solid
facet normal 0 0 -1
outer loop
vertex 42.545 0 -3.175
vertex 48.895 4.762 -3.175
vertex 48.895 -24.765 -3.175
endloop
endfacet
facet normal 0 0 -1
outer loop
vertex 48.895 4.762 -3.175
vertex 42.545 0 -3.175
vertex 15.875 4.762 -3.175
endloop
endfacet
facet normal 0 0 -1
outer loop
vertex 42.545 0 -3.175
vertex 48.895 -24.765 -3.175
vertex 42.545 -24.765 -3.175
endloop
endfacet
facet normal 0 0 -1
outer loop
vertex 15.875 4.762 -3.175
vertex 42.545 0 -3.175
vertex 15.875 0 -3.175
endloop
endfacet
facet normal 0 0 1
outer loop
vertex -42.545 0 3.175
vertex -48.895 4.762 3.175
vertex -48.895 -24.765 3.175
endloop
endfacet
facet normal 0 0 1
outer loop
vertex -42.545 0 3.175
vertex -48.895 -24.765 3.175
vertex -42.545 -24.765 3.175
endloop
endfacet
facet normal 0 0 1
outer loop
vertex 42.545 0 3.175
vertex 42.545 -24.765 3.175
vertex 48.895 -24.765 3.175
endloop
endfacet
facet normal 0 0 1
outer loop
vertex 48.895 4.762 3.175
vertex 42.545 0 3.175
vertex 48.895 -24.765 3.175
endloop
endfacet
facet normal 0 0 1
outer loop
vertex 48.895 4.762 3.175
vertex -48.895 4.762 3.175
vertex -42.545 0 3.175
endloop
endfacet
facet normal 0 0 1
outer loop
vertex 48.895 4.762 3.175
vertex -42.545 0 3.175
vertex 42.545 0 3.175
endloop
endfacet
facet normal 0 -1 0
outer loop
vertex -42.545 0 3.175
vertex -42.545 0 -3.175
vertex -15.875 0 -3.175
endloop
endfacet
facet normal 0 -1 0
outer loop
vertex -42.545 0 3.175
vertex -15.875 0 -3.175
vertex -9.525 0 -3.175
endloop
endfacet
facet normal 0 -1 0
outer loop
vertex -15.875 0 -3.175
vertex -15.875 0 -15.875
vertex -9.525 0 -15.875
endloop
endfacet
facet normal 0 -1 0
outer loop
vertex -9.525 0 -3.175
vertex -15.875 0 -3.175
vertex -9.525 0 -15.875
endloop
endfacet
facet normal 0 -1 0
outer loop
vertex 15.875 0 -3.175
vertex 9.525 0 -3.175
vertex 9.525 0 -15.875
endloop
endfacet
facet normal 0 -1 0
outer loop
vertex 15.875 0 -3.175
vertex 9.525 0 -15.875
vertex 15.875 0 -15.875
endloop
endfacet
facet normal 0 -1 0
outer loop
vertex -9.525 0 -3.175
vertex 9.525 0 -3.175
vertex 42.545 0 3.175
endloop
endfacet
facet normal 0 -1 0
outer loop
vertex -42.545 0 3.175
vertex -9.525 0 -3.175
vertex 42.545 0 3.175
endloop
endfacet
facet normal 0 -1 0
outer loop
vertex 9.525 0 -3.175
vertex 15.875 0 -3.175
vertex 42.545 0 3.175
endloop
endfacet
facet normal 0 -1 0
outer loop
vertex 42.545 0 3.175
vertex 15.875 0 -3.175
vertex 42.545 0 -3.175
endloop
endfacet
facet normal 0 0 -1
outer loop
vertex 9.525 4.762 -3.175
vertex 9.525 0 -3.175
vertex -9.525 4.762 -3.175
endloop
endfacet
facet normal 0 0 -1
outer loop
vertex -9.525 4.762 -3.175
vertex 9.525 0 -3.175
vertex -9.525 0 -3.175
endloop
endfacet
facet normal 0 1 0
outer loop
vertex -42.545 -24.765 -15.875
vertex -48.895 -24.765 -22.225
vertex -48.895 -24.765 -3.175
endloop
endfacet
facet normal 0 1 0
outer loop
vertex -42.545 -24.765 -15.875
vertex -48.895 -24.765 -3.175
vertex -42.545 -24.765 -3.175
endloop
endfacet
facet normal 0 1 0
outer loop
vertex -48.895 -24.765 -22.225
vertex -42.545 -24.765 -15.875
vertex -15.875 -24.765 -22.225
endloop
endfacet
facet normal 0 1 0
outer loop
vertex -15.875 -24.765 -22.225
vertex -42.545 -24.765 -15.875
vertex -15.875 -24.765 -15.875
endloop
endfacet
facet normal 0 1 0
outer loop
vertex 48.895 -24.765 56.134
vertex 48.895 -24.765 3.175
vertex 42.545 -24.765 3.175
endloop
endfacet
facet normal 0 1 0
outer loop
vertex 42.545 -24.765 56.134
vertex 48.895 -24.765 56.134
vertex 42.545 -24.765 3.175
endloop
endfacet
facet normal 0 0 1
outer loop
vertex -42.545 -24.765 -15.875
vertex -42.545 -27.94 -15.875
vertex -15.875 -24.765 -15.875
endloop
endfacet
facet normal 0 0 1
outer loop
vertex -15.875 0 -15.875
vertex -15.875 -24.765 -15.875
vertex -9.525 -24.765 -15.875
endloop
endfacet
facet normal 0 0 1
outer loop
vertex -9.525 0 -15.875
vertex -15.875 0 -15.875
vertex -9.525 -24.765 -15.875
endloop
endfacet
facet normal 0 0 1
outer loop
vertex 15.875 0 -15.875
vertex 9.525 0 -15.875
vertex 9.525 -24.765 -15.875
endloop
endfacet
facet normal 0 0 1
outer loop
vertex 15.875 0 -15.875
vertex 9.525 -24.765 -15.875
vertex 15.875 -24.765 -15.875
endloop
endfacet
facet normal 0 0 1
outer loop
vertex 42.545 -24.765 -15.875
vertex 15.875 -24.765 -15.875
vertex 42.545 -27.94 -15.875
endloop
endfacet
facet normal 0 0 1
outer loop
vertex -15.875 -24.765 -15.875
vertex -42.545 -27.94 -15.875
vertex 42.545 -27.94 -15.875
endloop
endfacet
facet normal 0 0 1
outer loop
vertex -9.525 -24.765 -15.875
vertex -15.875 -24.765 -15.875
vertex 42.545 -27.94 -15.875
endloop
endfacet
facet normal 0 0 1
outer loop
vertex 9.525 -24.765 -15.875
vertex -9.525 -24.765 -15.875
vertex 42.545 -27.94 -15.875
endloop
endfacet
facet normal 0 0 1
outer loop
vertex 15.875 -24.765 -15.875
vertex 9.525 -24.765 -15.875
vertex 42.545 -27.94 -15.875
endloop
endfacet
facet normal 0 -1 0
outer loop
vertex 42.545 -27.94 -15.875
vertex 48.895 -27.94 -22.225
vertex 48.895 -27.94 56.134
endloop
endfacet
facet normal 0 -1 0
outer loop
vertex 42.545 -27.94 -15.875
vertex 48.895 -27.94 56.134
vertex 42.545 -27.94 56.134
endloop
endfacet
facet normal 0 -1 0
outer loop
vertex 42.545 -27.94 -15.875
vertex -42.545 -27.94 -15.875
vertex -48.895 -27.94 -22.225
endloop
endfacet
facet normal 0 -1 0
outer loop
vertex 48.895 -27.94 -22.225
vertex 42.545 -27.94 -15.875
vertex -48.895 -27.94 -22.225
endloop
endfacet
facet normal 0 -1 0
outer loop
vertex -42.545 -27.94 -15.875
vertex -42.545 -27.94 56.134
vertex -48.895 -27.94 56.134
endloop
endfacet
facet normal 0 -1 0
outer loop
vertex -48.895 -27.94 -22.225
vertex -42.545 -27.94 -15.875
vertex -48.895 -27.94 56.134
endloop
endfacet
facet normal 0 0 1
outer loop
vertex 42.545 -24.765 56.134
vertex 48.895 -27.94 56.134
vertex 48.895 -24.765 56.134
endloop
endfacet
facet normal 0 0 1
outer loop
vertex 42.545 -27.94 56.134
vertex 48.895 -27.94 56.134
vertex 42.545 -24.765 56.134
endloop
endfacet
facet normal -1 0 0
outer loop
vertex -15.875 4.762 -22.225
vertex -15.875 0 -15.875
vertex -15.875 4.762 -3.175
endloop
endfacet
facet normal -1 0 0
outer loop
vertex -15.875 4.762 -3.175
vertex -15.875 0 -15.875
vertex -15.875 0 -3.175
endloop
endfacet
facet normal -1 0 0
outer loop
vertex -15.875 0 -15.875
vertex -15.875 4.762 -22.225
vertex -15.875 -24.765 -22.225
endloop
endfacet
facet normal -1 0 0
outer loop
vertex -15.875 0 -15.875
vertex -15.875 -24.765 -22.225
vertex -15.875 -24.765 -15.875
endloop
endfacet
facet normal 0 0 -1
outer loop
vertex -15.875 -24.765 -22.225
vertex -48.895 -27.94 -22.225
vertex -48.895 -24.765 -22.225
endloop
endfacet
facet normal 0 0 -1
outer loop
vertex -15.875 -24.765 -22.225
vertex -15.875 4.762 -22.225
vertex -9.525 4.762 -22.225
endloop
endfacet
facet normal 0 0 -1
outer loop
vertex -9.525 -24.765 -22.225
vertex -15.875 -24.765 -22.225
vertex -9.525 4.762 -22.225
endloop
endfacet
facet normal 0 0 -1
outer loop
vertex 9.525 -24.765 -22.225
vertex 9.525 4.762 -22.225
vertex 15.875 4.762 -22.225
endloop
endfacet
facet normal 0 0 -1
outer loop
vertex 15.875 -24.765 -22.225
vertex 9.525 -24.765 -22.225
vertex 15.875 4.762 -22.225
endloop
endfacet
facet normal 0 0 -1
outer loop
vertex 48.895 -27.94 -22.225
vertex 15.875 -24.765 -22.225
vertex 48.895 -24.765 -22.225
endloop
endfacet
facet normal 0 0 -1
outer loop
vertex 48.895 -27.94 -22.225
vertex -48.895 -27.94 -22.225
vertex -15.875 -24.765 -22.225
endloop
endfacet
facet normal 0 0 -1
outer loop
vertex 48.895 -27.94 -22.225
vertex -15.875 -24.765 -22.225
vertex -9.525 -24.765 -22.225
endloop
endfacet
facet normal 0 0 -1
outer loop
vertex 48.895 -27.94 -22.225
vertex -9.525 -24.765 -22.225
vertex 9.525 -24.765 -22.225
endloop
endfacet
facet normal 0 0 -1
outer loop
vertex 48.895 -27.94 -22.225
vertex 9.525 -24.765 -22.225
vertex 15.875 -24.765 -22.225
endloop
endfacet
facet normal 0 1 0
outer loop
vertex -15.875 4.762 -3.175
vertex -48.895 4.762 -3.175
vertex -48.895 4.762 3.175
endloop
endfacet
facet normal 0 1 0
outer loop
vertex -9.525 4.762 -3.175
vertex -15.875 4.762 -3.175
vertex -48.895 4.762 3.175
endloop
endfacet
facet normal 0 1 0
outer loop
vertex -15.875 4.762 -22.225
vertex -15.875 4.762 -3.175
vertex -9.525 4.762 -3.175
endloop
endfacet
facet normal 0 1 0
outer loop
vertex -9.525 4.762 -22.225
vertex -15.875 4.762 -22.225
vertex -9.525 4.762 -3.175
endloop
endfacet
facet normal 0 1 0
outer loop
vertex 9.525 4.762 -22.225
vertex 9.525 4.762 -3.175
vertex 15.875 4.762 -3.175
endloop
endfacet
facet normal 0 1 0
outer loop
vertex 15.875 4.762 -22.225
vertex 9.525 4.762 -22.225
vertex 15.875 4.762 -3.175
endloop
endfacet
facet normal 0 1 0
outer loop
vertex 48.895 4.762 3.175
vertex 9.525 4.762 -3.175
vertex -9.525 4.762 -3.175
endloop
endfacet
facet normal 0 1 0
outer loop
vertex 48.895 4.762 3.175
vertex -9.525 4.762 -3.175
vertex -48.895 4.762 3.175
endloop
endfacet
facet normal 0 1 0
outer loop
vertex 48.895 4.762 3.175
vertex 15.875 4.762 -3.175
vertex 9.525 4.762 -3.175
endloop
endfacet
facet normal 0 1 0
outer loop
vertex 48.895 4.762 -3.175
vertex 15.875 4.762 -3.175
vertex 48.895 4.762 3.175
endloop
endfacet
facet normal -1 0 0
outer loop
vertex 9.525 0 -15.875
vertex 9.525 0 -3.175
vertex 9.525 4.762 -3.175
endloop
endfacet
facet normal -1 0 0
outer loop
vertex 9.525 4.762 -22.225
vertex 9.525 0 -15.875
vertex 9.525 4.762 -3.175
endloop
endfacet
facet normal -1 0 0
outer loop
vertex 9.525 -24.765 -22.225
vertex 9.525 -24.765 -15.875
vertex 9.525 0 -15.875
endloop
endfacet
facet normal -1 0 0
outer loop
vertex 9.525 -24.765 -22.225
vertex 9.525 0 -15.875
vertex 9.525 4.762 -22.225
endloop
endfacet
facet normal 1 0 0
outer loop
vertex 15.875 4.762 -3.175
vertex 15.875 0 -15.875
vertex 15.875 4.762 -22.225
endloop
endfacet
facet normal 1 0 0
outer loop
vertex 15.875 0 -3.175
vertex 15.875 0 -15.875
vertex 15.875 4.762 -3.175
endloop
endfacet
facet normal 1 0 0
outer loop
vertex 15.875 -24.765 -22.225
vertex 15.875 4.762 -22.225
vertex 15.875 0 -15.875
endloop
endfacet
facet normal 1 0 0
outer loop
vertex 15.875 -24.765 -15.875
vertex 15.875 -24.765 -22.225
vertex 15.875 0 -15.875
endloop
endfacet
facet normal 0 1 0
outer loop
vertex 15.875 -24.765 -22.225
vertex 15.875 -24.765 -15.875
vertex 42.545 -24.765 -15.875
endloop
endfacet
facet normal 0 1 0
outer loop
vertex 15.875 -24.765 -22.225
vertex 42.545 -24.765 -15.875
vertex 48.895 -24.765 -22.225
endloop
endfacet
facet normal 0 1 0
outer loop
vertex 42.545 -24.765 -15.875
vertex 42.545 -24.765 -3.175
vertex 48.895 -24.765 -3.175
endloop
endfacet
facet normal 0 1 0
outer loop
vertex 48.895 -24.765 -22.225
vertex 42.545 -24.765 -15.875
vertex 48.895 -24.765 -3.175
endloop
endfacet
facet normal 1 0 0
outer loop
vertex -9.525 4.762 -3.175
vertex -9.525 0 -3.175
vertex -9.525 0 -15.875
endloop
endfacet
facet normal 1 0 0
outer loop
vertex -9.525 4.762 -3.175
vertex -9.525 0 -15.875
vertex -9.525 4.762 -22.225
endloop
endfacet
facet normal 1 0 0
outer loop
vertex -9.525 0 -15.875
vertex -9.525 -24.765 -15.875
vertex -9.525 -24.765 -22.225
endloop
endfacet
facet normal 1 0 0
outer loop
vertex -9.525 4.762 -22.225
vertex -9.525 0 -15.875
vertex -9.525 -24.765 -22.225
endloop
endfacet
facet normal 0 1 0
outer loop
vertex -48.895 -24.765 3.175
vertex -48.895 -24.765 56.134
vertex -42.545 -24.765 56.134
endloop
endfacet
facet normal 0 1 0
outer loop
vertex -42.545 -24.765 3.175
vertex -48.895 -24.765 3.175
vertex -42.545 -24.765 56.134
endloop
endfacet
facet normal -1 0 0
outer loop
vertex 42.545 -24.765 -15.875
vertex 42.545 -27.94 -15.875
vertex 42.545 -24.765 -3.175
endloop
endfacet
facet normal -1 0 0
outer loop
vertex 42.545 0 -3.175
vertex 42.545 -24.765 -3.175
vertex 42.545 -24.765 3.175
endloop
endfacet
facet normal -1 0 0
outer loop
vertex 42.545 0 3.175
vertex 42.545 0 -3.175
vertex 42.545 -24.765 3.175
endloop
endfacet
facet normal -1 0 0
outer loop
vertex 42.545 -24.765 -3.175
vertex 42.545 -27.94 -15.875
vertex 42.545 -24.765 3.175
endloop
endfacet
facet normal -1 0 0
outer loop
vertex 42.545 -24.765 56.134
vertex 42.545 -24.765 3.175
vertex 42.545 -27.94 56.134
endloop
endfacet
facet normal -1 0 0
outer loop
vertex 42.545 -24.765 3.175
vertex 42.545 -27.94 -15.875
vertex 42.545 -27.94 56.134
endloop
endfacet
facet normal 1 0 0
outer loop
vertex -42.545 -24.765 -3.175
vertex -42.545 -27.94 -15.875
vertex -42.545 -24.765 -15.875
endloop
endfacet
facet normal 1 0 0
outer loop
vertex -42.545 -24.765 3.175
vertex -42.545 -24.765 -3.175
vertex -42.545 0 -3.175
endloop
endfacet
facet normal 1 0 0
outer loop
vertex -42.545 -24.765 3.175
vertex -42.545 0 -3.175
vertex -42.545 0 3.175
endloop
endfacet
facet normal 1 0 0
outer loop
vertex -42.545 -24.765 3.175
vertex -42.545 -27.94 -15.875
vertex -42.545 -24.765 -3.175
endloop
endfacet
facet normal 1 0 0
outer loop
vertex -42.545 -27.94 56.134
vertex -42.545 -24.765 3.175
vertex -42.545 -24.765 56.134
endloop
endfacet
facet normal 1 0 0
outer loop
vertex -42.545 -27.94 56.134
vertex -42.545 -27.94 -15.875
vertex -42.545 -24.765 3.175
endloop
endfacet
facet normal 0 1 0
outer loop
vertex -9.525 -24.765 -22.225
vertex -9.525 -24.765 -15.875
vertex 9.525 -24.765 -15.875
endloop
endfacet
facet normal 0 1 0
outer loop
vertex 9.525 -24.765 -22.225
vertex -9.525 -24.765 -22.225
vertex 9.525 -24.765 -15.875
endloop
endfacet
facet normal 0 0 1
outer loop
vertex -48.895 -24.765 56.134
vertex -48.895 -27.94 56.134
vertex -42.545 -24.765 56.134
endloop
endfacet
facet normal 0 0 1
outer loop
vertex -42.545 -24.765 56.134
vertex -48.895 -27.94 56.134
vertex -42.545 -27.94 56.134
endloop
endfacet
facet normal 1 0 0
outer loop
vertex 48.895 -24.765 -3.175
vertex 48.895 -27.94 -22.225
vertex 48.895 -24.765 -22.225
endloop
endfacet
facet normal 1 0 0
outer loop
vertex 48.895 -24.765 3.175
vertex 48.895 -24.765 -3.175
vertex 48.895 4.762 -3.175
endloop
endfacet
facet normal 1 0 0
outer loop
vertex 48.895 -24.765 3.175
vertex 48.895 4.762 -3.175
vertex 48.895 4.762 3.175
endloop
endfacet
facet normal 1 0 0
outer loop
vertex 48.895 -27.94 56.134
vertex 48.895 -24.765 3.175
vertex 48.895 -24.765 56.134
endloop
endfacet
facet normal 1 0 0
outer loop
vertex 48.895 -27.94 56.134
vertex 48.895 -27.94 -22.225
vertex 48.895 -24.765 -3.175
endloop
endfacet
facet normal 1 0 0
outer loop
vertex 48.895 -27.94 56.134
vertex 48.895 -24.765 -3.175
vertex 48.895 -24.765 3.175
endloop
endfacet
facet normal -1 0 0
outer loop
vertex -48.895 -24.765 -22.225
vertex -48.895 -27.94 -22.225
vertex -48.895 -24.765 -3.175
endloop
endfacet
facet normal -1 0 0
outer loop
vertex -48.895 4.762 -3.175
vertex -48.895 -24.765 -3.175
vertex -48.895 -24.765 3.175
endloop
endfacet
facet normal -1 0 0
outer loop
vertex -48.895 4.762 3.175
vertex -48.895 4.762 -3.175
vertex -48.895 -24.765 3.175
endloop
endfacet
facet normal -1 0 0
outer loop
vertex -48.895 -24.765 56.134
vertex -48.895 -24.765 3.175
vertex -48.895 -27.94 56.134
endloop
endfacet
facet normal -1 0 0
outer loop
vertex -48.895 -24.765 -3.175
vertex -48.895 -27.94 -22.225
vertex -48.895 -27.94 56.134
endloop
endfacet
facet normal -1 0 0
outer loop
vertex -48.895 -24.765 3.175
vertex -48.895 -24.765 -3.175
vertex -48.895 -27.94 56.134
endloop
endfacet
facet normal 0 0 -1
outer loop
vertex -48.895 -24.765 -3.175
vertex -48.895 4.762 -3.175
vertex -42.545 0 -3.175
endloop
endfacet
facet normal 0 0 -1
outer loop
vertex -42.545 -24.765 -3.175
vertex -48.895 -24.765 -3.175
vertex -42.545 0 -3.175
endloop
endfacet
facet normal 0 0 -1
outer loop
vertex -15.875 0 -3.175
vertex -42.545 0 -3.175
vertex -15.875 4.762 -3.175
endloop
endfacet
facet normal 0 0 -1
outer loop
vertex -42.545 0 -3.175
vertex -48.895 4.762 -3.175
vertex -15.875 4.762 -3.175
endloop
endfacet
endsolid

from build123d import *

# Parameters (mm, degrees)
BOSS_EXTRUDE1_DEPTH = 4.7625
SKETCH1_3_W         = 6.35
SKETCH1_3_H         = 6.35
BOSS_EXTRUDE2_DEPTH = 27.94
SKETCH2_W           = 19.05
SKETCH2_H           = 6.35
BOSS_EXTRUDE3_DEPTH = 3.175
SKETCH3_W           = 6.35
SKETCH3_H           = 52.959
BOSS_EXTRUDE4_DEPTH = 3.175


with BuildPart() as part:
    # Sketch1 → Boss-Extrude1 (new body)
    with BuildSketch(Plane(origin=(0, 0, 0), x_dir=(1, 0, 0), z_dir=(0, 1, 0))):
        Polygon((-48.895, 3.175), (-48.895, -3.175), (48.895, -3.175), (48.895, 3.175), (-9.525, 3.175), (-9.525, 22.225), (-15.875, 22.225), (-15.875, 3.175), align=None)
    extrude(amount=BOSS_EXTRUDE1_DEPTH)

    # Sketch1<3> → Boss-Extrude2 (add)
    with BuildSketch(Plane(origin=(0, 0, 0), x_dir=(1, 0, 0), z_dir=(0, 1, 0))):
        with Locations((-45.72, 0)):
            Rectangle(SKETCH1_3_W, SKETCH1_3_H)
        with Locations((45.72, 0)):
            Rectangle(SKETCH1_3_W, SKETCH1_3_H)
        with Locations((-12.7, 19.05)):
            Rectangle(SKETCH1_3_W, SKETCH1_3_H)
    extrude(amount=-BOSS_EXTRUDE2_DEPTH)

    # Mirror1: part across plane


with BuildPart() as part_1:
    add(part.part)
    add(part.part.mirror(Plane(origin=(0, 0, 0), x_dir=(0, 0, 1), z_dir=(1, 0, 0))))

    # Sketch2 → Boss-Extrude3 (add)
    with BuildSketch(Plane.XZ.offset(27.94)):
        with Locations((0, -19.05)):
            Rectangle(SKETCH2_W, SKETCH2_H)
        Polygon((-42.545, 3.175), (-48.895, 3.175), (-48.895, -22.225), (-15.875, -22.225), (-15.875, -15.875), (-42.545, -15.875), align=None)
        Polygon((48.895, 3.175), (42.545, 3.175), (42.545, -15.875), (15.875, -15.875), (15.875, -22.225), (48.895, -22.225), align=None)
    extrude(amount=-BOSS_EXTRUDE3_DEPTH)

    # Sketch3 → Boss-Extrude4 (add)
    with BuildSketch(Plane.XZ.offset(27.94)):
        with Locations((-45.72, 29.6545)):
            Rectangle(SKETCH3_W, SKETCH3_H)
    boss_extrude4 = extrude(amount=-BOSS_EXTRUDE4_DEPTH)

    # Mirror2: Boss-Extrude4 across plane
    add(boss_extrude4.mirror(Plane(origin=(0, 0, 0), x_dir=(0, 0, 1), z_dir=(1, 0, 0))))


solid = part_1.part
